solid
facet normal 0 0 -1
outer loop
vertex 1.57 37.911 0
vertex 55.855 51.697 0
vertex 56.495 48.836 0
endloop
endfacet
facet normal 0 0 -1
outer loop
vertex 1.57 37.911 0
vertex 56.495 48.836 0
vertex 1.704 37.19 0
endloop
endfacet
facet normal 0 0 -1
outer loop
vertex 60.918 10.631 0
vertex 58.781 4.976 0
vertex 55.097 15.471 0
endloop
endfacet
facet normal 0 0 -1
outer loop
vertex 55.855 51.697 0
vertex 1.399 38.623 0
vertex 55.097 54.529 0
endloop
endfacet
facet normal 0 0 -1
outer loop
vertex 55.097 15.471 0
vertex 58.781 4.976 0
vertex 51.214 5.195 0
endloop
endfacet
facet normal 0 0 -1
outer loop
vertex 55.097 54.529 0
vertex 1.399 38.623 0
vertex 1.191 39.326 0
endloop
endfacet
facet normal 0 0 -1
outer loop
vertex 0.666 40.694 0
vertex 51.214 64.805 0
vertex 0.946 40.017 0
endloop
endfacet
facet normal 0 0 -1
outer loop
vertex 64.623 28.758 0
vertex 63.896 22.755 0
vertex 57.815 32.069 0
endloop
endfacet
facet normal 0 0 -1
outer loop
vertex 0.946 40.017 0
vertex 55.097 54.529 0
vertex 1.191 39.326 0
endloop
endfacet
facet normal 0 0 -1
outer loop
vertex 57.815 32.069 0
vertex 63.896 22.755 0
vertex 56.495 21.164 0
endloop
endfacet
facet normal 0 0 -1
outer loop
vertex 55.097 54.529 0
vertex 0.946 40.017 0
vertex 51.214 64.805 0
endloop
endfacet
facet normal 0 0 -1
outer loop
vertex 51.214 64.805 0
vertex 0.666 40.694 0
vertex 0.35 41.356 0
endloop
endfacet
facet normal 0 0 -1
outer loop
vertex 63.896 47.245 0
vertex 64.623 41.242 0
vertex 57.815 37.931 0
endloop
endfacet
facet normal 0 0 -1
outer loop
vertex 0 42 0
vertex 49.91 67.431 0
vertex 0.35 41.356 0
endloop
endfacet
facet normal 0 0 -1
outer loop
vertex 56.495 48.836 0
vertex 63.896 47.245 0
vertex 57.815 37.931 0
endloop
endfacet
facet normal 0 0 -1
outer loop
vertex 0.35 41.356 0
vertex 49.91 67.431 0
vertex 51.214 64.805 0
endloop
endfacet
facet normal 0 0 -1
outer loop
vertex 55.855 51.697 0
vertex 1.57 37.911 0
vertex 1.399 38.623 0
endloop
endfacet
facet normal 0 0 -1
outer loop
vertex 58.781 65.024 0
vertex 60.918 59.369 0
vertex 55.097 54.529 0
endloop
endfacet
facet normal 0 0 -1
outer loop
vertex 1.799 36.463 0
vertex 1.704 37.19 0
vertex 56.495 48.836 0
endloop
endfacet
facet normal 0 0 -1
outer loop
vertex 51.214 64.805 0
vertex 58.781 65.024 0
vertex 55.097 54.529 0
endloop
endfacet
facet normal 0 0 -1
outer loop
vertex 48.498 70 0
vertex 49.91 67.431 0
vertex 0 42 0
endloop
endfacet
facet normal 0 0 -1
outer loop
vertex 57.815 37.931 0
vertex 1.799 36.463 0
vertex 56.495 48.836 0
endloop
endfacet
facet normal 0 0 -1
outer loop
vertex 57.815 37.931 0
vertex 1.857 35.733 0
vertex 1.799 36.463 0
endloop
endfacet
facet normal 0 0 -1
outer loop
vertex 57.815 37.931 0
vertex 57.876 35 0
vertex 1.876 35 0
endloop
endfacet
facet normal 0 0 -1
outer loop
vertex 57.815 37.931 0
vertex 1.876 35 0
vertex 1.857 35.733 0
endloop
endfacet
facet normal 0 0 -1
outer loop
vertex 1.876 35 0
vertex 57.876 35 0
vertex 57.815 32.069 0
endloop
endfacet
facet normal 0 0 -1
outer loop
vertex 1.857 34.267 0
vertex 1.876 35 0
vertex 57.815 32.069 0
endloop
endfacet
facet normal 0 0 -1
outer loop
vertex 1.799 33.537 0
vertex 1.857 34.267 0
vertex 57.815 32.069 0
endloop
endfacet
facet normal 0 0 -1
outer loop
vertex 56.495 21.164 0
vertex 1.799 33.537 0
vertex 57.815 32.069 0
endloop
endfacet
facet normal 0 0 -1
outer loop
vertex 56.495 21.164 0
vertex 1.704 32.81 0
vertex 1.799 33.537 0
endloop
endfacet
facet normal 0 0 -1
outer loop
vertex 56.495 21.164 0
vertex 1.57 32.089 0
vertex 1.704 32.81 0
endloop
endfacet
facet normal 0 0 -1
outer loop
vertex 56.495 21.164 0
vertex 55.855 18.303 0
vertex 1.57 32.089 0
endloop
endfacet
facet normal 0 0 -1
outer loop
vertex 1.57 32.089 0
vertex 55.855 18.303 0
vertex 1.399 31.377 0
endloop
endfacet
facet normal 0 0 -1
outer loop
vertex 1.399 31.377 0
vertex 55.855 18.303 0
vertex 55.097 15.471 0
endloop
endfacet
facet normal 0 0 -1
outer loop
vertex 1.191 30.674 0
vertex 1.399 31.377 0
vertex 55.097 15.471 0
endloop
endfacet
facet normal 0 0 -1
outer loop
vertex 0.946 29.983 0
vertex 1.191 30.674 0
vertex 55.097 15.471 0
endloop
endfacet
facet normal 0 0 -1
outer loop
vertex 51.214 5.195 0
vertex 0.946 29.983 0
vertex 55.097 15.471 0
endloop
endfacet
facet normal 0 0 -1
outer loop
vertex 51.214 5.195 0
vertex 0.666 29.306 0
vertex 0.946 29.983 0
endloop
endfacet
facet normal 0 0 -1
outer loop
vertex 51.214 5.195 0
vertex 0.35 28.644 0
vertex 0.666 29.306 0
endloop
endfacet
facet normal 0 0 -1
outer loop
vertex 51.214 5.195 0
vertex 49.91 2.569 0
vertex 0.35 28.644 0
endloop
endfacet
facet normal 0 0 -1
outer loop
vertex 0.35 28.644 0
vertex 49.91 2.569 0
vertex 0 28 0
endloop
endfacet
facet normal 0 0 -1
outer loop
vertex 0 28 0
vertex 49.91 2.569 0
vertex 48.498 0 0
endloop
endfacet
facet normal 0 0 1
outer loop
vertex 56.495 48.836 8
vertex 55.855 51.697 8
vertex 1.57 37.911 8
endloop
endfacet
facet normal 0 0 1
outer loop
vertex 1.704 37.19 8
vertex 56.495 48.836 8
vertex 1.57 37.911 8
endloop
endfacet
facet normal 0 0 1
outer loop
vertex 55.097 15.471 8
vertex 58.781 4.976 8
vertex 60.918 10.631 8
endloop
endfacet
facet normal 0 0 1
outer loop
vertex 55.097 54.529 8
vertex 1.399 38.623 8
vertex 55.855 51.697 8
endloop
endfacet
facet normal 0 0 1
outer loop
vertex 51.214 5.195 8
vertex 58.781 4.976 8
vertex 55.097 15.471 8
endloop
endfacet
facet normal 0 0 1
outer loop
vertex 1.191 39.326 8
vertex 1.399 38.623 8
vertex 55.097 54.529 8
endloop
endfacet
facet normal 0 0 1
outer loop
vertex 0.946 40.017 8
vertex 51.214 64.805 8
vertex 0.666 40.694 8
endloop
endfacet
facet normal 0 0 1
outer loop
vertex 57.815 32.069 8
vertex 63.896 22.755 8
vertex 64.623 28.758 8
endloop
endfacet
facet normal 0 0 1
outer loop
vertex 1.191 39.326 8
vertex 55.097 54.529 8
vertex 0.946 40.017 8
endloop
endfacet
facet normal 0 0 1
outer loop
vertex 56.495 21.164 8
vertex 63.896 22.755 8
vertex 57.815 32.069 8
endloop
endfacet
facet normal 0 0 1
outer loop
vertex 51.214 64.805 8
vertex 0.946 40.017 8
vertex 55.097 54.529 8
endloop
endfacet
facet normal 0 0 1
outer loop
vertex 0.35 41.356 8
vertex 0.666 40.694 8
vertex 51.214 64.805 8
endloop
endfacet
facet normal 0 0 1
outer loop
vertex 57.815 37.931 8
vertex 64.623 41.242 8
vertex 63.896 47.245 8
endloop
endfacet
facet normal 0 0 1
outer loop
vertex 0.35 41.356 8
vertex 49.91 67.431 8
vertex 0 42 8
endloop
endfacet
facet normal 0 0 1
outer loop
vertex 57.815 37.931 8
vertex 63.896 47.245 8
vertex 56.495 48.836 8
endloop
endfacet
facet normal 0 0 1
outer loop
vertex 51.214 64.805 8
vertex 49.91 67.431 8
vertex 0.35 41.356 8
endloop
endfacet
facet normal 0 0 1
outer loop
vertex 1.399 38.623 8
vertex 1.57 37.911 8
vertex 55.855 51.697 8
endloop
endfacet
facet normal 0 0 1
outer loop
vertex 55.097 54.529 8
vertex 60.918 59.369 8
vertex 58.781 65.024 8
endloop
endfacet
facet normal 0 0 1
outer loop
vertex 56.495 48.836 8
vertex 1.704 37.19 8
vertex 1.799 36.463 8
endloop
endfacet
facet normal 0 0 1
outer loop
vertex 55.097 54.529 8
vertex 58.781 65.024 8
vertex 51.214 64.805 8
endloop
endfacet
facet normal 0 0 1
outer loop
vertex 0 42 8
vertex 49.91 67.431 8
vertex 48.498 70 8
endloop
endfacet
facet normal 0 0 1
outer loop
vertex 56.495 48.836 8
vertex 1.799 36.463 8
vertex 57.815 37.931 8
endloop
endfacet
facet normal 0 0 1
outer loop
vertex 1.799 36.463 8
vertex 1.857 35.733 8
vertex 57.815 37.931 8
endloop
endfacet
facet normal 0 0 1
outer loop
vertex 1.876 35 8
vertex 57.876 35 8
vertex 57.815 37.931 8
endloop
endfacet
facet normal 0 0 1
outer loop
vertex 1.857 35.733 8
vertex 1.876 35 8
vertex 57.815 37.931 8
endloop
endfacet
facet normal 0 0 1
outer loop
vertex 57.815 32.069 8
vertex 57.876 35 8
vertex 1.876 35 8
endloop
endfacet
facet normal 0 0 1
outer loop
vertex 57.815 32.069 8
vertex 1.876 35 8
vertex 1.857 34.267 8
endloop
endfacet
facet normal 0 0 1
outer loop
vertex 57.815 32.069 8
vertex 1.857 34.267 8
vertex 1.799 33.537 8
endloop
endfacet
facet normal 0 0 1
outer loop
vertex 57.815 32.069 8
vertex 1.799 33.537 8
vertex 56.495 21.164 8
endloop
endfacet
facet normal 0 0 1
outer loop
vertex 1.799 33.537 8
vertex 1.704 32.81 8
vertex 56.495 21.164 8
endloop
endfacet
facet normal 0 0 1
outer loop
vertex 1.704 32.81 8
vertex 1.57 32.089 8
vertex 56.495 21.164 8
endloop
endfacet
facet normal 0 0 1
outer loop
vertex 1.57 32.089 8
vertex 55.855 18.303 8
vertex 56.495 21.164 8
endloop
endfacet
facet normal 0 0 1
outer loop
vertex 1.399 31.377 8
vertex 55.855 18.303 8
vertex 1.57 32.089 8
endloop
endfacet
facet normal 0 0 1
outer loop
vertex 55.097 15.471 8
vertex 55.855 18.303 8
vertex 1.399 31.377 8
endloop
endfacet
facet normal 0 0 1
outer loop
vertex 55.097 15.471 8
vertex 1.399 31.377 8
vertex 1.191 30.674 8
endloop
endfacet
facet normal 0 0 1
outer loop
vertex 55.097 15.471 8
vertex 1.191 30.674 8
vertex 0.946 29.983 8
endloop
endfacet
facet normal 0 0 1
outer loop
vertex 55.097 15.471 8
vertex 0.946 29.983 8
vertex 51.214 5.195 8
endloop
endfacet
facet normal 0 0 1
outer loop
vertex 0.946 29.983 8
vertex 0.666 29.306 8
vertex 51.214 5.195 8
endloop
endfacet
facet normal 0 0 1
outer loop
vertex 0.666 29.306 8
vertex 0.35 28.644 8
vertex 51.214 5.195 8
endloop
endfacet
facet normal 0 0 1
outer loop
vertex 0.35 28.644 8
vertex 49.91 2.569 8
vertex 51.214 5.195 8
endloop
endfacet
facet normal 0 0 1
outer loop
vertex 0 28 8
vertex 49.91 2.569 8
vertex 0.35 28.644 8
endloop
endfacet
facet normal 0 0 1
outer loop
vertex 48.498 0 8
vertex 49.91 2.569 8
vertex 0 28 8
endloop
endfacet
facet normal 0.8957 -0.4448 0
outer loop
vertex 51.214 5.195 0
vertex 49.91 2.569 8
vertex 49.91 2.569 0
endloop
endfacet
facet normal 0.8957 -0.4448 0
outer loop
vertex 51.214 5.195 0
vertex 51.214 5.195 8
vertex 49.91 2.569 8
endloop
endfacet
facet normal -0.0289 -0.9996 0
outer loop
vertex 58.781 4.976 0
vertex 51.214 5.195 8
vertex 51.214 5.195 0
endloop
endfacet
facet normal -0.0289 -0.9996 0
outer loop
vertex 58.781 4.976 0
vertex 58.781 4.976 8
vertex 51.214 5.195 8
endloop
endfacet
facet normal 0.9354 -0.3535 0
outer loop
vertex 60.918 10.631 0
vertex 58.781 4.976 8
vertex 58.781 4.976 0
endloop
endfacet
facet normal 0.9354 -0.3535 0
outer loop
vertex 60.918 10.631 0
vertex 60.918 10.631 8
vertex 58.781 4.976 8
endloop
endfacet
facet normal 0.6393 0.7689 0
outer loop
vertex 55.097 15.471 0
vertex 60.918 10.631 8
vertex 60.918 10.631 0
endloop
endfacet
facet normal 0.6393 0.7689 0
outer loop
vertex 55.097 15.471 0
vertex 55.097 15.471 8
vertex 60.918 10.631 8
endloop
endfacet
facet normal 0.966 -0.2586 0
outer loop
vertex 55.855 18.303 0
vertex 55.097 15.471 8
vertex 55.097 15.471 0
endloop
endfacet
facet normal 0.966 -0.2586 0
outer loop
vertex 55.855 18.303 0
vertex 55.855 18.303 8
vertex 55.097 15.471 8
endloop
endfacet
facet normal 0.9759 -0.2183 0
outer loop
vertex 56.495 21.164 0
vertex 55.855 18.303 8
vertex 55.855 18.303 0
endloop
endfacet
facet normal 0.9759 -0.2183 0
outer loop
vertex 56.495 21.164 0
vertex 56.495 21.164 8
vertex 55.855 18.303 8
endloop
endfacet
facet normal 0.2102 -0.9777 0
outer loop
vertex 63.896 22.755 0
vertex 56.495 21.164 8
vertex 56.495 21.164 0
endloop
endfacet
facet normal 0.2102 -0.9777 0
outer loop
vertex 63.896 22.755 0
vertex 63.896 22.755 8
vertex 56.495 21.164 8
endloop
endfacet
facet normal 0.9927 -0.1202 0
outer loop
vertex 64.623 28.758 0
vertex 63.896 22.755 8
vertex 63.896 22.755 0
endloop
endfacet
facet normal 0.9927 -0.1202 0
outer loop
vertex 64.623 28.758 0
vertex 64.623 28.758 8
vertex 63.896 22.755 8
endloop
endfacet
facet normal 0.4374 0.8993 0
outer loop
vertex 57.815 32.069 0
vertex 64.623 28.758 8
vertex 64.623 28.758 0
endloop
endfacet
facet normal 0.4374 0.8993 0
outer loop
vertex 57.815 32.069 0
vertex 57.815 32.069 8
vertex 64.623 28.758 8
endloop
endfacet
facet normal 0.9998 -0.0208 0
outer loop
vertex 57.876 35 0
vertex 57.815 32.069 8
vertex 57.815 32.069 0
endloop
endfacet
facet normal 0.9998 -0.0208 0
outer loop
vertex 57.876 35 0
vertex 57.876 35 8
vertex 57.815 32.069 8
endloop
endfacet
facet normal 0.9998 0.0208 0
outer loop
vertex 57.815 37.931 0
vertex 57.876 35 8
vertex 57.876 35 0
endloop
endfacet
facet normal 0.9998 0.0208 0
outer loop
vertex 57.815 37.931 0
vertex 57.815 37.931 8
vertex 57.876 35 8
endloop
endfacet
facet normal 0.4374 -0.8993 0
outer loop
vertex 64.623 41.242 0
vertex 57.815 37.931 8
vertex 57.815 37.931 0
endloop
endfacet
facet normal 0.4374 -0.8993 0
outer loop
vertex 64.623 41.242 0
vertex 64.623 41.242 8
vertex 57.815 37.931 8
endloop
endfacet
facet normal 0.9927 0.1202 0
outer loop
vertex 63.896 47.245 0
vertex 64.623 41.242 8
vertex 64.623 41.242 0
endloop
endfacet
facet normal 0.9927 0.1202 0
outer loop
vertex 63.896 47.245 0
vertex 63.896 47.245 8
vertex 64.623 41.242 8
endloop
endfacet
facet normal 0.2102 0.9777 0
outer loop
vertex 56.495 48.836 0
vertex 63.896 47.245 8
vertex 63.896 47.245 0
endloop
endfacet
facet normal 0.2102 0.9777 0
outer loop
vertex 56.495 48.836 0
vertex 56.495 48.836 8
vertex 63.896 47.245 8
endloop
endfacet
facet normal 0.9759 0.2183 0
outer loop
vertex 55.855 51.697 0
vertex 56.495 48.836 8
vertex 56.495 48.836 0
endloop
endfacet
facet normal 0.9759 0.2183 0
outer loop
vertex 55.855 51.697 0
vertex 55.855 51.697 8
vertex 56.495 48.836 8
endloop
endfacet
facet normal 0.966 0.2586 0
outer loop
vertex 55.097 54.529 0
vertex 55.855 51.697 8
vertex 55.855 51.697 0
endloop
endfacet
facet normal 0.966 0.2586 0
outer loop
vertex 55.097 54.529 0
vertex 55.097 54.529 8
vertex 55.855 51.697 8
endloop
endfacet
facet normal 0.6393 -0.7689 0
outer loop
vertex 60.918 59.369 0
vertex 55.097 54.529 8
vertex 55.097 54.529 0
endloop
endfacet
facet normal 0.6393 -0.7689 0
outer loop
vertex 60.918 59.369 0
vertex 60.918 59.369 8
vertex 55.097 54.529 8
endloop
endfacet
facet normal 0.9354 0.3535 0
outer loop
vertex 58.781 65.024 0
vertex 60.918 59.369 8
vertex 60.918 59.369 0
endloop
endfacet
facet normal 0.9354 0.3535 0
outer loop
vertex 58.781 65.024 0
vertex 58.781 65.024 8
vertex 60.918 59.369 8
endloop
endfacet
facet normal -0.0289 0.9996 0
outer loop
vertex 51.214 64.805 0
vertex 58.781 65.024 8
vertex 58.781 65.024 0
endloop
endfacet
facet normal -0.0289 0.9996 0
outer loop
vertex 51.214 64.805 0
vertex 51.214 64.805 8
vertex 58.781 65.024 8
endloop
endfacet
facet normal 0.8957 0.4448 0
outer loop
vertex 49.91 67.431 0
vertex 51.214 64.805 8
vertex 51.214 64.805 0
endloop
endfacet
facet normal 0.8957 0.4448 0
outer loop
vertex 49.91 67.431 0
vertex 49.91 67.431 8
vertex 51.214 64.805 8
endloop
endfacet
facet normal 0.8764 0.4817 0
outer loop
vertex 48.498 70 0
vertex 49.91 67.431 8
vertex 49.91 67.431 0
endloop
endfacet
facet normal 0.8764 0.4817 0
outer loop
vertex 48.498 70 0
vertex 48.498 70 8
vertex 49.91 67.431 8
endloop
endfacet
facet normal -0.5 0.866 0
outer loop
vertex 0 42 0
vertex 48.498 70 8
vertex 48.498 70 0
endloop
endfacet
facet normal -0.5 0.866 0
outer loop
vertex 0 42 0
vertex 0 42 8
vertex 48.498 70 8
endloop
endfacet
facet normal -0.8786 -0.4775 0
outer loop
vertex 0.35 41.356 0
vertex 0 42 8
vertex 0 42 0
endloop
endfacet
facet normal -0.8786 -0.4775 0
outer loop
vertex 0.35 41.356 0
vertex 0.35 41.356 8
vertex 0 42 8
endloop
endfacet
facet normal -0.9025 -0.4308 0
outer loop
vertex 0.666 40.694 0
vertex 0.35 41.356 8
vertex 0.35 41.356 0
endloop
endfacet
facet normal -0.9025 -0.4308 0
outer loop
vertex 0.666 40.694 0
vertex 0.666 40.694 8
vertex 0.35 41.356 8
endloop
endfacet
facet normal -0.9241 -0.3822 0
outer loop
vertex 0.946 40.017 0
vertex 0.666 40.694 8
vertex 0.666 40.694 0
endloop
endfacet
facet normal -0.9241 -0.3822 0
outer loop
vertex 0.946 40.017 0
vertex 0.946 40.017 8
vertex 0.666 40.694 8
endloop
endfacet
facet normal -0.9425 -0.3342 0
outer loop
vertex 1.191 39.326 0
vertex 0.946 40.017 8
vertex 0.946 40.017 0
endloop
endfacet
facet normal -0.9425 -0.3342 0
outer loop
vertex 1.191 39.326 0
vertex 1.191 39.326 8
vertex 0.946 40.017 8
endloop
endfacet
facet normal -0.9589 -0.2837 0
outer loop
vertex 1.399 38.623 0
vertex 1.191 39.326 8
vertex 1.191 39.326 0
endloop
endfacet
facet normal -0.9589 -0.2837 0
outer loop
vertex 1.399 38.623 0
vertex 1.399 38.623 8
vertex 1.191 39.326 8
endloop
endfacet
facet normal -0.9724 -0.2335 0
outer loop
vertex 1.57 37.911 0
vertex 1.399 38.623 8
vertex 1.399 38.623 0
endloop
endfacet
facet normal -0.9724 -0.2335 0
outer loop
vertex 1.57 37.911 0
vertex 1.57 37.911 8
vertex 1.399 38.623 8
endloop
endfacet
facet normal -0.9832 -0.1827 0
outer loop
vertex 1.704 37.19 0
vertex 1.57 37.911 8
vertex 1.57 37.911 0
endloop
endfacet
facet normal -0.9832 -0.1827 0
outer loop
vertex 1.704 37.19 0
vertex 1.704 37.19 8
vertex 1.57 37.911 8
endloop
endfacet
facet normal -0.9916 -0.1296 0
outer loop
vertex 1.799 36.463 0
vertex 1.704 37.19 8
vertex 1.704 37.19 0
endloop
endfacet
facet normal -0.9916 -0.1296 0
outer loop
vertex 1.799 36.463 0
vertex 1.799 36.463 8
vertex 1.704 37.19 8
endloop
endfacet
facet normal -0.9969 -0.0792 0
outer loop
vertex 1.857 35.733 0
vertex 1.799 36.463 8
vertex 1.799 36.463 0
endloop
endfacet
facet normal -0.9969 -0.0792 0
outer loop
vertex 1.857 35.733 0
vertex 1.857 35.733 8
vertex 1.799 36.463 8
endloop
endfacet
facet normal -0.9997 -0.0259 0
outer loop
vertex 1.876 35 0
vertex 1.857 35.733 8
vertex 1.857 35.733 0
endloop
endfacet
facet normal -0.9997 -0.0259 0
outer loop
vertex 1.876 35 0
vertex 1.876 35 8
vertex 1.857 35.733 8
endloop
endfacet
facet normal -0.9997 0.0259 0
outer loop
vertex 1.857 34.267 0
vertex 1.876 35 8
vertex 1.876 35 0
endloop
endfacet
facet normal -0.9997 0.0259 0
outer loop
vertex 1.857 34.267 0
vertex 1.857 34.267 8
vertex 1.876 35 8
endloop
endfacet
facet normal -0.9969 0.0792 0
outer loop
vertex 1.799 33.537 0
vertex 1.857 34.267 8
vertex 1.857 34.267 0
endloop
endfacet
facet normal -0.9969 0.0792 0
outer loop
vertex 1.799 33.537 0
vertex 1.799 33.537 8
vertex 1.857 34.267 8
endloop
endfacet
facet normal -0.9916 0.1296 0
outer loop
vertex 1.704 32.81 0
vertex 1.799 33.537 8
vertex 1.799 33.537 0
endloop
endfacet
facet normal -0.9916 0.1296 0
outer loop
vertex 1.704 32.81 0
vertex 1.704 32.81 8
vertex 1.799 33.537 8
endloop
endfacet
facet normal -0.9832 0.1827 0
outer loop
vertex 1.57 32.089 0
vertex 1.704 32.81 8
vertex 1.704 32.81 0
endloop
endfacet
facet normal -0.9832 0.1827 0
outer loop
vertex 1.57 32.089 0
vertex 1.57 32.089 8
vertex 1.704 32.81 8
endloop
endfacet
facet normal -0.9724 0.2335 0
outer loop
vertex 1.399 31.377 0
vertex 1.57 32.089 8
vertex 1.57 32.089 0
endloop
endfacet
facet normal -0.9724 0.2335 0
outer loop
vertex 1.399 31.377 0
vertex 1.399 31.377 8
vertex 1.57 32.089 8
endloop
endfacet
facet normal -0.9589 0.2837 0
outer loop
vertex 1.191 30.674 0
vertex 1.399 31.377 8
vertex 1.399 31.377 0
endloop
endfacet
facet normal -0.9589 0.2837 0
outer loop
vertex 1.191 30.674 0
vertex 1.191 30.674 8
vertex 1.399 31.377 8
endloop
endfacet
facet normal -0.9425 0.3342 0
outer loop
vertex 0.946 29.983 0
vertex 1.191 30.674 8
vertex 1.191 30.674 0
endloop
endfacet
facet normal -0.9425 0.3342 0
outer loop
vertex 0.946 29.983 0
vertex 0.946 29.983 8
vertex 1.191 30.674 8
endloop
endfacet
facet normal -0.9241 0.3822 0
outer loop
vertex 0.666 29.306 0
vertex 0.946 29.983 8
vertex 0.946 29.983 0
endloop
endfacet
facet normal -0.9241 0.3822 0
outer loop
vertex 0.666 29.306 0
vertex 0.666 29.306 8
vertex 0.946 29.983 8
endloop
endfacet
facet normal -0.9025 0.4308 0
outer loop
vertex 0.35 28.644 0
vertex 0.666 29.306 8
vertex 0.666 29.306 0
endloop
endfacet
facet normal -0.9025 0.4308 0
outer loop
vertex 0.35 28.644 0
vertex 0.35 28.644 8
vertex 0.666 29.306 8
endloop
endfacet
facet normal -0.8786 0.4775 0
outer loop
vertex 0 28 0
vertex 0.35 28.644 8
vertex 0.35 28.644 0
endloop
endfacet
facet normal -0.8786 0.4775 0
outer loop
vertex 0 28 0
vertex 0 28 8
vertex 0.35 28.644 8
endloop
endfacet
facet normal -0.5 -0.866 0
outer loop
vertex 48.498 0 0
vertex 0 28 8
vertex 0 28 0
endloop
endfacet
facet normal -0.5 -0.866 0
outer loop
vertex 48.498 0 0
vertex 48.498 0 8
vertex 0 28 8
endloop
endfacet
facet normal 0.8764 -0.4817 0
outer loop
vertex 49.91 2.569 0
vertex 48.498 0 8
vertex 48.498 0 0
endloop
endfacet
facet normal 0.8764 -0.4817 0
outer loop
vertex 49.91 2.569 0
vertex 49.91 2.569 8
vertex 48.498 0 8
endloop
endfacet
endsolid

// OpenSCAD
$fn = 32;

// ----------------------------------------------------------------------
// Gear sector: 4 teeth on 60 degrees
// ----------------------------------------------------------------------

// --- parameters (mm) ---
sector_angle = 60;        // sector angle, degrees
root_r = 70;              // root circle radius
tooth_h = 7;              // tooth height over the root circle
teeth = 4;                // number of teeth on the sector
hub_r = 14;               // hub bore radius
plate_t = 8;              // sector thickness, Z
arc_step = 3;             // sampling step of the root/hub arcs, degrees

tip_r = root_r + tooth_h;  // tip circle radius

profile = [[48.498, 0], [49.91, 2.569], [51.214, 5.195], [58.781, 4.976], [60.918, 10.631], [55.097, 15.471], [55.855, 18.303], [56.495, 21.164], [63.896, 22.755], [64.623, 28.758], [57.815, 32.069], [57.876, 35], [57.815, 37.931], [64.623, 41.242], [63.896, 47.245], [56.495, 48.836], [55.855, 51.697], [55.097, 54.529], [60.918, 59.369], [58.781, 65.024], [51.214, 64.805], [49.91, 67.431], [48.498, 70], [0, 42], [0.35, 41.356], [0.666, 40.694], [0.946, 40.017], [1.191, 39.326], [1.399, 38.623], [1.57, 37.911], [1.704, 37.19], [1.799, 36.463], [1.857, 35.733], [1.876, 35], [1.857, 34.267], [1.799, 33.537], [1.704, 32.81], [1.57, 32.089], [1.399, 31.377], [1.191, 30.674], [0.946, 29.983], [0.666, 29.306], [0.35, 28.644], [0, 28]];  // primary outline, 44 points, counter clockwise

// --- the one profile operation ---
linear_extrude(height = plate_t) polygon(points = profile);
